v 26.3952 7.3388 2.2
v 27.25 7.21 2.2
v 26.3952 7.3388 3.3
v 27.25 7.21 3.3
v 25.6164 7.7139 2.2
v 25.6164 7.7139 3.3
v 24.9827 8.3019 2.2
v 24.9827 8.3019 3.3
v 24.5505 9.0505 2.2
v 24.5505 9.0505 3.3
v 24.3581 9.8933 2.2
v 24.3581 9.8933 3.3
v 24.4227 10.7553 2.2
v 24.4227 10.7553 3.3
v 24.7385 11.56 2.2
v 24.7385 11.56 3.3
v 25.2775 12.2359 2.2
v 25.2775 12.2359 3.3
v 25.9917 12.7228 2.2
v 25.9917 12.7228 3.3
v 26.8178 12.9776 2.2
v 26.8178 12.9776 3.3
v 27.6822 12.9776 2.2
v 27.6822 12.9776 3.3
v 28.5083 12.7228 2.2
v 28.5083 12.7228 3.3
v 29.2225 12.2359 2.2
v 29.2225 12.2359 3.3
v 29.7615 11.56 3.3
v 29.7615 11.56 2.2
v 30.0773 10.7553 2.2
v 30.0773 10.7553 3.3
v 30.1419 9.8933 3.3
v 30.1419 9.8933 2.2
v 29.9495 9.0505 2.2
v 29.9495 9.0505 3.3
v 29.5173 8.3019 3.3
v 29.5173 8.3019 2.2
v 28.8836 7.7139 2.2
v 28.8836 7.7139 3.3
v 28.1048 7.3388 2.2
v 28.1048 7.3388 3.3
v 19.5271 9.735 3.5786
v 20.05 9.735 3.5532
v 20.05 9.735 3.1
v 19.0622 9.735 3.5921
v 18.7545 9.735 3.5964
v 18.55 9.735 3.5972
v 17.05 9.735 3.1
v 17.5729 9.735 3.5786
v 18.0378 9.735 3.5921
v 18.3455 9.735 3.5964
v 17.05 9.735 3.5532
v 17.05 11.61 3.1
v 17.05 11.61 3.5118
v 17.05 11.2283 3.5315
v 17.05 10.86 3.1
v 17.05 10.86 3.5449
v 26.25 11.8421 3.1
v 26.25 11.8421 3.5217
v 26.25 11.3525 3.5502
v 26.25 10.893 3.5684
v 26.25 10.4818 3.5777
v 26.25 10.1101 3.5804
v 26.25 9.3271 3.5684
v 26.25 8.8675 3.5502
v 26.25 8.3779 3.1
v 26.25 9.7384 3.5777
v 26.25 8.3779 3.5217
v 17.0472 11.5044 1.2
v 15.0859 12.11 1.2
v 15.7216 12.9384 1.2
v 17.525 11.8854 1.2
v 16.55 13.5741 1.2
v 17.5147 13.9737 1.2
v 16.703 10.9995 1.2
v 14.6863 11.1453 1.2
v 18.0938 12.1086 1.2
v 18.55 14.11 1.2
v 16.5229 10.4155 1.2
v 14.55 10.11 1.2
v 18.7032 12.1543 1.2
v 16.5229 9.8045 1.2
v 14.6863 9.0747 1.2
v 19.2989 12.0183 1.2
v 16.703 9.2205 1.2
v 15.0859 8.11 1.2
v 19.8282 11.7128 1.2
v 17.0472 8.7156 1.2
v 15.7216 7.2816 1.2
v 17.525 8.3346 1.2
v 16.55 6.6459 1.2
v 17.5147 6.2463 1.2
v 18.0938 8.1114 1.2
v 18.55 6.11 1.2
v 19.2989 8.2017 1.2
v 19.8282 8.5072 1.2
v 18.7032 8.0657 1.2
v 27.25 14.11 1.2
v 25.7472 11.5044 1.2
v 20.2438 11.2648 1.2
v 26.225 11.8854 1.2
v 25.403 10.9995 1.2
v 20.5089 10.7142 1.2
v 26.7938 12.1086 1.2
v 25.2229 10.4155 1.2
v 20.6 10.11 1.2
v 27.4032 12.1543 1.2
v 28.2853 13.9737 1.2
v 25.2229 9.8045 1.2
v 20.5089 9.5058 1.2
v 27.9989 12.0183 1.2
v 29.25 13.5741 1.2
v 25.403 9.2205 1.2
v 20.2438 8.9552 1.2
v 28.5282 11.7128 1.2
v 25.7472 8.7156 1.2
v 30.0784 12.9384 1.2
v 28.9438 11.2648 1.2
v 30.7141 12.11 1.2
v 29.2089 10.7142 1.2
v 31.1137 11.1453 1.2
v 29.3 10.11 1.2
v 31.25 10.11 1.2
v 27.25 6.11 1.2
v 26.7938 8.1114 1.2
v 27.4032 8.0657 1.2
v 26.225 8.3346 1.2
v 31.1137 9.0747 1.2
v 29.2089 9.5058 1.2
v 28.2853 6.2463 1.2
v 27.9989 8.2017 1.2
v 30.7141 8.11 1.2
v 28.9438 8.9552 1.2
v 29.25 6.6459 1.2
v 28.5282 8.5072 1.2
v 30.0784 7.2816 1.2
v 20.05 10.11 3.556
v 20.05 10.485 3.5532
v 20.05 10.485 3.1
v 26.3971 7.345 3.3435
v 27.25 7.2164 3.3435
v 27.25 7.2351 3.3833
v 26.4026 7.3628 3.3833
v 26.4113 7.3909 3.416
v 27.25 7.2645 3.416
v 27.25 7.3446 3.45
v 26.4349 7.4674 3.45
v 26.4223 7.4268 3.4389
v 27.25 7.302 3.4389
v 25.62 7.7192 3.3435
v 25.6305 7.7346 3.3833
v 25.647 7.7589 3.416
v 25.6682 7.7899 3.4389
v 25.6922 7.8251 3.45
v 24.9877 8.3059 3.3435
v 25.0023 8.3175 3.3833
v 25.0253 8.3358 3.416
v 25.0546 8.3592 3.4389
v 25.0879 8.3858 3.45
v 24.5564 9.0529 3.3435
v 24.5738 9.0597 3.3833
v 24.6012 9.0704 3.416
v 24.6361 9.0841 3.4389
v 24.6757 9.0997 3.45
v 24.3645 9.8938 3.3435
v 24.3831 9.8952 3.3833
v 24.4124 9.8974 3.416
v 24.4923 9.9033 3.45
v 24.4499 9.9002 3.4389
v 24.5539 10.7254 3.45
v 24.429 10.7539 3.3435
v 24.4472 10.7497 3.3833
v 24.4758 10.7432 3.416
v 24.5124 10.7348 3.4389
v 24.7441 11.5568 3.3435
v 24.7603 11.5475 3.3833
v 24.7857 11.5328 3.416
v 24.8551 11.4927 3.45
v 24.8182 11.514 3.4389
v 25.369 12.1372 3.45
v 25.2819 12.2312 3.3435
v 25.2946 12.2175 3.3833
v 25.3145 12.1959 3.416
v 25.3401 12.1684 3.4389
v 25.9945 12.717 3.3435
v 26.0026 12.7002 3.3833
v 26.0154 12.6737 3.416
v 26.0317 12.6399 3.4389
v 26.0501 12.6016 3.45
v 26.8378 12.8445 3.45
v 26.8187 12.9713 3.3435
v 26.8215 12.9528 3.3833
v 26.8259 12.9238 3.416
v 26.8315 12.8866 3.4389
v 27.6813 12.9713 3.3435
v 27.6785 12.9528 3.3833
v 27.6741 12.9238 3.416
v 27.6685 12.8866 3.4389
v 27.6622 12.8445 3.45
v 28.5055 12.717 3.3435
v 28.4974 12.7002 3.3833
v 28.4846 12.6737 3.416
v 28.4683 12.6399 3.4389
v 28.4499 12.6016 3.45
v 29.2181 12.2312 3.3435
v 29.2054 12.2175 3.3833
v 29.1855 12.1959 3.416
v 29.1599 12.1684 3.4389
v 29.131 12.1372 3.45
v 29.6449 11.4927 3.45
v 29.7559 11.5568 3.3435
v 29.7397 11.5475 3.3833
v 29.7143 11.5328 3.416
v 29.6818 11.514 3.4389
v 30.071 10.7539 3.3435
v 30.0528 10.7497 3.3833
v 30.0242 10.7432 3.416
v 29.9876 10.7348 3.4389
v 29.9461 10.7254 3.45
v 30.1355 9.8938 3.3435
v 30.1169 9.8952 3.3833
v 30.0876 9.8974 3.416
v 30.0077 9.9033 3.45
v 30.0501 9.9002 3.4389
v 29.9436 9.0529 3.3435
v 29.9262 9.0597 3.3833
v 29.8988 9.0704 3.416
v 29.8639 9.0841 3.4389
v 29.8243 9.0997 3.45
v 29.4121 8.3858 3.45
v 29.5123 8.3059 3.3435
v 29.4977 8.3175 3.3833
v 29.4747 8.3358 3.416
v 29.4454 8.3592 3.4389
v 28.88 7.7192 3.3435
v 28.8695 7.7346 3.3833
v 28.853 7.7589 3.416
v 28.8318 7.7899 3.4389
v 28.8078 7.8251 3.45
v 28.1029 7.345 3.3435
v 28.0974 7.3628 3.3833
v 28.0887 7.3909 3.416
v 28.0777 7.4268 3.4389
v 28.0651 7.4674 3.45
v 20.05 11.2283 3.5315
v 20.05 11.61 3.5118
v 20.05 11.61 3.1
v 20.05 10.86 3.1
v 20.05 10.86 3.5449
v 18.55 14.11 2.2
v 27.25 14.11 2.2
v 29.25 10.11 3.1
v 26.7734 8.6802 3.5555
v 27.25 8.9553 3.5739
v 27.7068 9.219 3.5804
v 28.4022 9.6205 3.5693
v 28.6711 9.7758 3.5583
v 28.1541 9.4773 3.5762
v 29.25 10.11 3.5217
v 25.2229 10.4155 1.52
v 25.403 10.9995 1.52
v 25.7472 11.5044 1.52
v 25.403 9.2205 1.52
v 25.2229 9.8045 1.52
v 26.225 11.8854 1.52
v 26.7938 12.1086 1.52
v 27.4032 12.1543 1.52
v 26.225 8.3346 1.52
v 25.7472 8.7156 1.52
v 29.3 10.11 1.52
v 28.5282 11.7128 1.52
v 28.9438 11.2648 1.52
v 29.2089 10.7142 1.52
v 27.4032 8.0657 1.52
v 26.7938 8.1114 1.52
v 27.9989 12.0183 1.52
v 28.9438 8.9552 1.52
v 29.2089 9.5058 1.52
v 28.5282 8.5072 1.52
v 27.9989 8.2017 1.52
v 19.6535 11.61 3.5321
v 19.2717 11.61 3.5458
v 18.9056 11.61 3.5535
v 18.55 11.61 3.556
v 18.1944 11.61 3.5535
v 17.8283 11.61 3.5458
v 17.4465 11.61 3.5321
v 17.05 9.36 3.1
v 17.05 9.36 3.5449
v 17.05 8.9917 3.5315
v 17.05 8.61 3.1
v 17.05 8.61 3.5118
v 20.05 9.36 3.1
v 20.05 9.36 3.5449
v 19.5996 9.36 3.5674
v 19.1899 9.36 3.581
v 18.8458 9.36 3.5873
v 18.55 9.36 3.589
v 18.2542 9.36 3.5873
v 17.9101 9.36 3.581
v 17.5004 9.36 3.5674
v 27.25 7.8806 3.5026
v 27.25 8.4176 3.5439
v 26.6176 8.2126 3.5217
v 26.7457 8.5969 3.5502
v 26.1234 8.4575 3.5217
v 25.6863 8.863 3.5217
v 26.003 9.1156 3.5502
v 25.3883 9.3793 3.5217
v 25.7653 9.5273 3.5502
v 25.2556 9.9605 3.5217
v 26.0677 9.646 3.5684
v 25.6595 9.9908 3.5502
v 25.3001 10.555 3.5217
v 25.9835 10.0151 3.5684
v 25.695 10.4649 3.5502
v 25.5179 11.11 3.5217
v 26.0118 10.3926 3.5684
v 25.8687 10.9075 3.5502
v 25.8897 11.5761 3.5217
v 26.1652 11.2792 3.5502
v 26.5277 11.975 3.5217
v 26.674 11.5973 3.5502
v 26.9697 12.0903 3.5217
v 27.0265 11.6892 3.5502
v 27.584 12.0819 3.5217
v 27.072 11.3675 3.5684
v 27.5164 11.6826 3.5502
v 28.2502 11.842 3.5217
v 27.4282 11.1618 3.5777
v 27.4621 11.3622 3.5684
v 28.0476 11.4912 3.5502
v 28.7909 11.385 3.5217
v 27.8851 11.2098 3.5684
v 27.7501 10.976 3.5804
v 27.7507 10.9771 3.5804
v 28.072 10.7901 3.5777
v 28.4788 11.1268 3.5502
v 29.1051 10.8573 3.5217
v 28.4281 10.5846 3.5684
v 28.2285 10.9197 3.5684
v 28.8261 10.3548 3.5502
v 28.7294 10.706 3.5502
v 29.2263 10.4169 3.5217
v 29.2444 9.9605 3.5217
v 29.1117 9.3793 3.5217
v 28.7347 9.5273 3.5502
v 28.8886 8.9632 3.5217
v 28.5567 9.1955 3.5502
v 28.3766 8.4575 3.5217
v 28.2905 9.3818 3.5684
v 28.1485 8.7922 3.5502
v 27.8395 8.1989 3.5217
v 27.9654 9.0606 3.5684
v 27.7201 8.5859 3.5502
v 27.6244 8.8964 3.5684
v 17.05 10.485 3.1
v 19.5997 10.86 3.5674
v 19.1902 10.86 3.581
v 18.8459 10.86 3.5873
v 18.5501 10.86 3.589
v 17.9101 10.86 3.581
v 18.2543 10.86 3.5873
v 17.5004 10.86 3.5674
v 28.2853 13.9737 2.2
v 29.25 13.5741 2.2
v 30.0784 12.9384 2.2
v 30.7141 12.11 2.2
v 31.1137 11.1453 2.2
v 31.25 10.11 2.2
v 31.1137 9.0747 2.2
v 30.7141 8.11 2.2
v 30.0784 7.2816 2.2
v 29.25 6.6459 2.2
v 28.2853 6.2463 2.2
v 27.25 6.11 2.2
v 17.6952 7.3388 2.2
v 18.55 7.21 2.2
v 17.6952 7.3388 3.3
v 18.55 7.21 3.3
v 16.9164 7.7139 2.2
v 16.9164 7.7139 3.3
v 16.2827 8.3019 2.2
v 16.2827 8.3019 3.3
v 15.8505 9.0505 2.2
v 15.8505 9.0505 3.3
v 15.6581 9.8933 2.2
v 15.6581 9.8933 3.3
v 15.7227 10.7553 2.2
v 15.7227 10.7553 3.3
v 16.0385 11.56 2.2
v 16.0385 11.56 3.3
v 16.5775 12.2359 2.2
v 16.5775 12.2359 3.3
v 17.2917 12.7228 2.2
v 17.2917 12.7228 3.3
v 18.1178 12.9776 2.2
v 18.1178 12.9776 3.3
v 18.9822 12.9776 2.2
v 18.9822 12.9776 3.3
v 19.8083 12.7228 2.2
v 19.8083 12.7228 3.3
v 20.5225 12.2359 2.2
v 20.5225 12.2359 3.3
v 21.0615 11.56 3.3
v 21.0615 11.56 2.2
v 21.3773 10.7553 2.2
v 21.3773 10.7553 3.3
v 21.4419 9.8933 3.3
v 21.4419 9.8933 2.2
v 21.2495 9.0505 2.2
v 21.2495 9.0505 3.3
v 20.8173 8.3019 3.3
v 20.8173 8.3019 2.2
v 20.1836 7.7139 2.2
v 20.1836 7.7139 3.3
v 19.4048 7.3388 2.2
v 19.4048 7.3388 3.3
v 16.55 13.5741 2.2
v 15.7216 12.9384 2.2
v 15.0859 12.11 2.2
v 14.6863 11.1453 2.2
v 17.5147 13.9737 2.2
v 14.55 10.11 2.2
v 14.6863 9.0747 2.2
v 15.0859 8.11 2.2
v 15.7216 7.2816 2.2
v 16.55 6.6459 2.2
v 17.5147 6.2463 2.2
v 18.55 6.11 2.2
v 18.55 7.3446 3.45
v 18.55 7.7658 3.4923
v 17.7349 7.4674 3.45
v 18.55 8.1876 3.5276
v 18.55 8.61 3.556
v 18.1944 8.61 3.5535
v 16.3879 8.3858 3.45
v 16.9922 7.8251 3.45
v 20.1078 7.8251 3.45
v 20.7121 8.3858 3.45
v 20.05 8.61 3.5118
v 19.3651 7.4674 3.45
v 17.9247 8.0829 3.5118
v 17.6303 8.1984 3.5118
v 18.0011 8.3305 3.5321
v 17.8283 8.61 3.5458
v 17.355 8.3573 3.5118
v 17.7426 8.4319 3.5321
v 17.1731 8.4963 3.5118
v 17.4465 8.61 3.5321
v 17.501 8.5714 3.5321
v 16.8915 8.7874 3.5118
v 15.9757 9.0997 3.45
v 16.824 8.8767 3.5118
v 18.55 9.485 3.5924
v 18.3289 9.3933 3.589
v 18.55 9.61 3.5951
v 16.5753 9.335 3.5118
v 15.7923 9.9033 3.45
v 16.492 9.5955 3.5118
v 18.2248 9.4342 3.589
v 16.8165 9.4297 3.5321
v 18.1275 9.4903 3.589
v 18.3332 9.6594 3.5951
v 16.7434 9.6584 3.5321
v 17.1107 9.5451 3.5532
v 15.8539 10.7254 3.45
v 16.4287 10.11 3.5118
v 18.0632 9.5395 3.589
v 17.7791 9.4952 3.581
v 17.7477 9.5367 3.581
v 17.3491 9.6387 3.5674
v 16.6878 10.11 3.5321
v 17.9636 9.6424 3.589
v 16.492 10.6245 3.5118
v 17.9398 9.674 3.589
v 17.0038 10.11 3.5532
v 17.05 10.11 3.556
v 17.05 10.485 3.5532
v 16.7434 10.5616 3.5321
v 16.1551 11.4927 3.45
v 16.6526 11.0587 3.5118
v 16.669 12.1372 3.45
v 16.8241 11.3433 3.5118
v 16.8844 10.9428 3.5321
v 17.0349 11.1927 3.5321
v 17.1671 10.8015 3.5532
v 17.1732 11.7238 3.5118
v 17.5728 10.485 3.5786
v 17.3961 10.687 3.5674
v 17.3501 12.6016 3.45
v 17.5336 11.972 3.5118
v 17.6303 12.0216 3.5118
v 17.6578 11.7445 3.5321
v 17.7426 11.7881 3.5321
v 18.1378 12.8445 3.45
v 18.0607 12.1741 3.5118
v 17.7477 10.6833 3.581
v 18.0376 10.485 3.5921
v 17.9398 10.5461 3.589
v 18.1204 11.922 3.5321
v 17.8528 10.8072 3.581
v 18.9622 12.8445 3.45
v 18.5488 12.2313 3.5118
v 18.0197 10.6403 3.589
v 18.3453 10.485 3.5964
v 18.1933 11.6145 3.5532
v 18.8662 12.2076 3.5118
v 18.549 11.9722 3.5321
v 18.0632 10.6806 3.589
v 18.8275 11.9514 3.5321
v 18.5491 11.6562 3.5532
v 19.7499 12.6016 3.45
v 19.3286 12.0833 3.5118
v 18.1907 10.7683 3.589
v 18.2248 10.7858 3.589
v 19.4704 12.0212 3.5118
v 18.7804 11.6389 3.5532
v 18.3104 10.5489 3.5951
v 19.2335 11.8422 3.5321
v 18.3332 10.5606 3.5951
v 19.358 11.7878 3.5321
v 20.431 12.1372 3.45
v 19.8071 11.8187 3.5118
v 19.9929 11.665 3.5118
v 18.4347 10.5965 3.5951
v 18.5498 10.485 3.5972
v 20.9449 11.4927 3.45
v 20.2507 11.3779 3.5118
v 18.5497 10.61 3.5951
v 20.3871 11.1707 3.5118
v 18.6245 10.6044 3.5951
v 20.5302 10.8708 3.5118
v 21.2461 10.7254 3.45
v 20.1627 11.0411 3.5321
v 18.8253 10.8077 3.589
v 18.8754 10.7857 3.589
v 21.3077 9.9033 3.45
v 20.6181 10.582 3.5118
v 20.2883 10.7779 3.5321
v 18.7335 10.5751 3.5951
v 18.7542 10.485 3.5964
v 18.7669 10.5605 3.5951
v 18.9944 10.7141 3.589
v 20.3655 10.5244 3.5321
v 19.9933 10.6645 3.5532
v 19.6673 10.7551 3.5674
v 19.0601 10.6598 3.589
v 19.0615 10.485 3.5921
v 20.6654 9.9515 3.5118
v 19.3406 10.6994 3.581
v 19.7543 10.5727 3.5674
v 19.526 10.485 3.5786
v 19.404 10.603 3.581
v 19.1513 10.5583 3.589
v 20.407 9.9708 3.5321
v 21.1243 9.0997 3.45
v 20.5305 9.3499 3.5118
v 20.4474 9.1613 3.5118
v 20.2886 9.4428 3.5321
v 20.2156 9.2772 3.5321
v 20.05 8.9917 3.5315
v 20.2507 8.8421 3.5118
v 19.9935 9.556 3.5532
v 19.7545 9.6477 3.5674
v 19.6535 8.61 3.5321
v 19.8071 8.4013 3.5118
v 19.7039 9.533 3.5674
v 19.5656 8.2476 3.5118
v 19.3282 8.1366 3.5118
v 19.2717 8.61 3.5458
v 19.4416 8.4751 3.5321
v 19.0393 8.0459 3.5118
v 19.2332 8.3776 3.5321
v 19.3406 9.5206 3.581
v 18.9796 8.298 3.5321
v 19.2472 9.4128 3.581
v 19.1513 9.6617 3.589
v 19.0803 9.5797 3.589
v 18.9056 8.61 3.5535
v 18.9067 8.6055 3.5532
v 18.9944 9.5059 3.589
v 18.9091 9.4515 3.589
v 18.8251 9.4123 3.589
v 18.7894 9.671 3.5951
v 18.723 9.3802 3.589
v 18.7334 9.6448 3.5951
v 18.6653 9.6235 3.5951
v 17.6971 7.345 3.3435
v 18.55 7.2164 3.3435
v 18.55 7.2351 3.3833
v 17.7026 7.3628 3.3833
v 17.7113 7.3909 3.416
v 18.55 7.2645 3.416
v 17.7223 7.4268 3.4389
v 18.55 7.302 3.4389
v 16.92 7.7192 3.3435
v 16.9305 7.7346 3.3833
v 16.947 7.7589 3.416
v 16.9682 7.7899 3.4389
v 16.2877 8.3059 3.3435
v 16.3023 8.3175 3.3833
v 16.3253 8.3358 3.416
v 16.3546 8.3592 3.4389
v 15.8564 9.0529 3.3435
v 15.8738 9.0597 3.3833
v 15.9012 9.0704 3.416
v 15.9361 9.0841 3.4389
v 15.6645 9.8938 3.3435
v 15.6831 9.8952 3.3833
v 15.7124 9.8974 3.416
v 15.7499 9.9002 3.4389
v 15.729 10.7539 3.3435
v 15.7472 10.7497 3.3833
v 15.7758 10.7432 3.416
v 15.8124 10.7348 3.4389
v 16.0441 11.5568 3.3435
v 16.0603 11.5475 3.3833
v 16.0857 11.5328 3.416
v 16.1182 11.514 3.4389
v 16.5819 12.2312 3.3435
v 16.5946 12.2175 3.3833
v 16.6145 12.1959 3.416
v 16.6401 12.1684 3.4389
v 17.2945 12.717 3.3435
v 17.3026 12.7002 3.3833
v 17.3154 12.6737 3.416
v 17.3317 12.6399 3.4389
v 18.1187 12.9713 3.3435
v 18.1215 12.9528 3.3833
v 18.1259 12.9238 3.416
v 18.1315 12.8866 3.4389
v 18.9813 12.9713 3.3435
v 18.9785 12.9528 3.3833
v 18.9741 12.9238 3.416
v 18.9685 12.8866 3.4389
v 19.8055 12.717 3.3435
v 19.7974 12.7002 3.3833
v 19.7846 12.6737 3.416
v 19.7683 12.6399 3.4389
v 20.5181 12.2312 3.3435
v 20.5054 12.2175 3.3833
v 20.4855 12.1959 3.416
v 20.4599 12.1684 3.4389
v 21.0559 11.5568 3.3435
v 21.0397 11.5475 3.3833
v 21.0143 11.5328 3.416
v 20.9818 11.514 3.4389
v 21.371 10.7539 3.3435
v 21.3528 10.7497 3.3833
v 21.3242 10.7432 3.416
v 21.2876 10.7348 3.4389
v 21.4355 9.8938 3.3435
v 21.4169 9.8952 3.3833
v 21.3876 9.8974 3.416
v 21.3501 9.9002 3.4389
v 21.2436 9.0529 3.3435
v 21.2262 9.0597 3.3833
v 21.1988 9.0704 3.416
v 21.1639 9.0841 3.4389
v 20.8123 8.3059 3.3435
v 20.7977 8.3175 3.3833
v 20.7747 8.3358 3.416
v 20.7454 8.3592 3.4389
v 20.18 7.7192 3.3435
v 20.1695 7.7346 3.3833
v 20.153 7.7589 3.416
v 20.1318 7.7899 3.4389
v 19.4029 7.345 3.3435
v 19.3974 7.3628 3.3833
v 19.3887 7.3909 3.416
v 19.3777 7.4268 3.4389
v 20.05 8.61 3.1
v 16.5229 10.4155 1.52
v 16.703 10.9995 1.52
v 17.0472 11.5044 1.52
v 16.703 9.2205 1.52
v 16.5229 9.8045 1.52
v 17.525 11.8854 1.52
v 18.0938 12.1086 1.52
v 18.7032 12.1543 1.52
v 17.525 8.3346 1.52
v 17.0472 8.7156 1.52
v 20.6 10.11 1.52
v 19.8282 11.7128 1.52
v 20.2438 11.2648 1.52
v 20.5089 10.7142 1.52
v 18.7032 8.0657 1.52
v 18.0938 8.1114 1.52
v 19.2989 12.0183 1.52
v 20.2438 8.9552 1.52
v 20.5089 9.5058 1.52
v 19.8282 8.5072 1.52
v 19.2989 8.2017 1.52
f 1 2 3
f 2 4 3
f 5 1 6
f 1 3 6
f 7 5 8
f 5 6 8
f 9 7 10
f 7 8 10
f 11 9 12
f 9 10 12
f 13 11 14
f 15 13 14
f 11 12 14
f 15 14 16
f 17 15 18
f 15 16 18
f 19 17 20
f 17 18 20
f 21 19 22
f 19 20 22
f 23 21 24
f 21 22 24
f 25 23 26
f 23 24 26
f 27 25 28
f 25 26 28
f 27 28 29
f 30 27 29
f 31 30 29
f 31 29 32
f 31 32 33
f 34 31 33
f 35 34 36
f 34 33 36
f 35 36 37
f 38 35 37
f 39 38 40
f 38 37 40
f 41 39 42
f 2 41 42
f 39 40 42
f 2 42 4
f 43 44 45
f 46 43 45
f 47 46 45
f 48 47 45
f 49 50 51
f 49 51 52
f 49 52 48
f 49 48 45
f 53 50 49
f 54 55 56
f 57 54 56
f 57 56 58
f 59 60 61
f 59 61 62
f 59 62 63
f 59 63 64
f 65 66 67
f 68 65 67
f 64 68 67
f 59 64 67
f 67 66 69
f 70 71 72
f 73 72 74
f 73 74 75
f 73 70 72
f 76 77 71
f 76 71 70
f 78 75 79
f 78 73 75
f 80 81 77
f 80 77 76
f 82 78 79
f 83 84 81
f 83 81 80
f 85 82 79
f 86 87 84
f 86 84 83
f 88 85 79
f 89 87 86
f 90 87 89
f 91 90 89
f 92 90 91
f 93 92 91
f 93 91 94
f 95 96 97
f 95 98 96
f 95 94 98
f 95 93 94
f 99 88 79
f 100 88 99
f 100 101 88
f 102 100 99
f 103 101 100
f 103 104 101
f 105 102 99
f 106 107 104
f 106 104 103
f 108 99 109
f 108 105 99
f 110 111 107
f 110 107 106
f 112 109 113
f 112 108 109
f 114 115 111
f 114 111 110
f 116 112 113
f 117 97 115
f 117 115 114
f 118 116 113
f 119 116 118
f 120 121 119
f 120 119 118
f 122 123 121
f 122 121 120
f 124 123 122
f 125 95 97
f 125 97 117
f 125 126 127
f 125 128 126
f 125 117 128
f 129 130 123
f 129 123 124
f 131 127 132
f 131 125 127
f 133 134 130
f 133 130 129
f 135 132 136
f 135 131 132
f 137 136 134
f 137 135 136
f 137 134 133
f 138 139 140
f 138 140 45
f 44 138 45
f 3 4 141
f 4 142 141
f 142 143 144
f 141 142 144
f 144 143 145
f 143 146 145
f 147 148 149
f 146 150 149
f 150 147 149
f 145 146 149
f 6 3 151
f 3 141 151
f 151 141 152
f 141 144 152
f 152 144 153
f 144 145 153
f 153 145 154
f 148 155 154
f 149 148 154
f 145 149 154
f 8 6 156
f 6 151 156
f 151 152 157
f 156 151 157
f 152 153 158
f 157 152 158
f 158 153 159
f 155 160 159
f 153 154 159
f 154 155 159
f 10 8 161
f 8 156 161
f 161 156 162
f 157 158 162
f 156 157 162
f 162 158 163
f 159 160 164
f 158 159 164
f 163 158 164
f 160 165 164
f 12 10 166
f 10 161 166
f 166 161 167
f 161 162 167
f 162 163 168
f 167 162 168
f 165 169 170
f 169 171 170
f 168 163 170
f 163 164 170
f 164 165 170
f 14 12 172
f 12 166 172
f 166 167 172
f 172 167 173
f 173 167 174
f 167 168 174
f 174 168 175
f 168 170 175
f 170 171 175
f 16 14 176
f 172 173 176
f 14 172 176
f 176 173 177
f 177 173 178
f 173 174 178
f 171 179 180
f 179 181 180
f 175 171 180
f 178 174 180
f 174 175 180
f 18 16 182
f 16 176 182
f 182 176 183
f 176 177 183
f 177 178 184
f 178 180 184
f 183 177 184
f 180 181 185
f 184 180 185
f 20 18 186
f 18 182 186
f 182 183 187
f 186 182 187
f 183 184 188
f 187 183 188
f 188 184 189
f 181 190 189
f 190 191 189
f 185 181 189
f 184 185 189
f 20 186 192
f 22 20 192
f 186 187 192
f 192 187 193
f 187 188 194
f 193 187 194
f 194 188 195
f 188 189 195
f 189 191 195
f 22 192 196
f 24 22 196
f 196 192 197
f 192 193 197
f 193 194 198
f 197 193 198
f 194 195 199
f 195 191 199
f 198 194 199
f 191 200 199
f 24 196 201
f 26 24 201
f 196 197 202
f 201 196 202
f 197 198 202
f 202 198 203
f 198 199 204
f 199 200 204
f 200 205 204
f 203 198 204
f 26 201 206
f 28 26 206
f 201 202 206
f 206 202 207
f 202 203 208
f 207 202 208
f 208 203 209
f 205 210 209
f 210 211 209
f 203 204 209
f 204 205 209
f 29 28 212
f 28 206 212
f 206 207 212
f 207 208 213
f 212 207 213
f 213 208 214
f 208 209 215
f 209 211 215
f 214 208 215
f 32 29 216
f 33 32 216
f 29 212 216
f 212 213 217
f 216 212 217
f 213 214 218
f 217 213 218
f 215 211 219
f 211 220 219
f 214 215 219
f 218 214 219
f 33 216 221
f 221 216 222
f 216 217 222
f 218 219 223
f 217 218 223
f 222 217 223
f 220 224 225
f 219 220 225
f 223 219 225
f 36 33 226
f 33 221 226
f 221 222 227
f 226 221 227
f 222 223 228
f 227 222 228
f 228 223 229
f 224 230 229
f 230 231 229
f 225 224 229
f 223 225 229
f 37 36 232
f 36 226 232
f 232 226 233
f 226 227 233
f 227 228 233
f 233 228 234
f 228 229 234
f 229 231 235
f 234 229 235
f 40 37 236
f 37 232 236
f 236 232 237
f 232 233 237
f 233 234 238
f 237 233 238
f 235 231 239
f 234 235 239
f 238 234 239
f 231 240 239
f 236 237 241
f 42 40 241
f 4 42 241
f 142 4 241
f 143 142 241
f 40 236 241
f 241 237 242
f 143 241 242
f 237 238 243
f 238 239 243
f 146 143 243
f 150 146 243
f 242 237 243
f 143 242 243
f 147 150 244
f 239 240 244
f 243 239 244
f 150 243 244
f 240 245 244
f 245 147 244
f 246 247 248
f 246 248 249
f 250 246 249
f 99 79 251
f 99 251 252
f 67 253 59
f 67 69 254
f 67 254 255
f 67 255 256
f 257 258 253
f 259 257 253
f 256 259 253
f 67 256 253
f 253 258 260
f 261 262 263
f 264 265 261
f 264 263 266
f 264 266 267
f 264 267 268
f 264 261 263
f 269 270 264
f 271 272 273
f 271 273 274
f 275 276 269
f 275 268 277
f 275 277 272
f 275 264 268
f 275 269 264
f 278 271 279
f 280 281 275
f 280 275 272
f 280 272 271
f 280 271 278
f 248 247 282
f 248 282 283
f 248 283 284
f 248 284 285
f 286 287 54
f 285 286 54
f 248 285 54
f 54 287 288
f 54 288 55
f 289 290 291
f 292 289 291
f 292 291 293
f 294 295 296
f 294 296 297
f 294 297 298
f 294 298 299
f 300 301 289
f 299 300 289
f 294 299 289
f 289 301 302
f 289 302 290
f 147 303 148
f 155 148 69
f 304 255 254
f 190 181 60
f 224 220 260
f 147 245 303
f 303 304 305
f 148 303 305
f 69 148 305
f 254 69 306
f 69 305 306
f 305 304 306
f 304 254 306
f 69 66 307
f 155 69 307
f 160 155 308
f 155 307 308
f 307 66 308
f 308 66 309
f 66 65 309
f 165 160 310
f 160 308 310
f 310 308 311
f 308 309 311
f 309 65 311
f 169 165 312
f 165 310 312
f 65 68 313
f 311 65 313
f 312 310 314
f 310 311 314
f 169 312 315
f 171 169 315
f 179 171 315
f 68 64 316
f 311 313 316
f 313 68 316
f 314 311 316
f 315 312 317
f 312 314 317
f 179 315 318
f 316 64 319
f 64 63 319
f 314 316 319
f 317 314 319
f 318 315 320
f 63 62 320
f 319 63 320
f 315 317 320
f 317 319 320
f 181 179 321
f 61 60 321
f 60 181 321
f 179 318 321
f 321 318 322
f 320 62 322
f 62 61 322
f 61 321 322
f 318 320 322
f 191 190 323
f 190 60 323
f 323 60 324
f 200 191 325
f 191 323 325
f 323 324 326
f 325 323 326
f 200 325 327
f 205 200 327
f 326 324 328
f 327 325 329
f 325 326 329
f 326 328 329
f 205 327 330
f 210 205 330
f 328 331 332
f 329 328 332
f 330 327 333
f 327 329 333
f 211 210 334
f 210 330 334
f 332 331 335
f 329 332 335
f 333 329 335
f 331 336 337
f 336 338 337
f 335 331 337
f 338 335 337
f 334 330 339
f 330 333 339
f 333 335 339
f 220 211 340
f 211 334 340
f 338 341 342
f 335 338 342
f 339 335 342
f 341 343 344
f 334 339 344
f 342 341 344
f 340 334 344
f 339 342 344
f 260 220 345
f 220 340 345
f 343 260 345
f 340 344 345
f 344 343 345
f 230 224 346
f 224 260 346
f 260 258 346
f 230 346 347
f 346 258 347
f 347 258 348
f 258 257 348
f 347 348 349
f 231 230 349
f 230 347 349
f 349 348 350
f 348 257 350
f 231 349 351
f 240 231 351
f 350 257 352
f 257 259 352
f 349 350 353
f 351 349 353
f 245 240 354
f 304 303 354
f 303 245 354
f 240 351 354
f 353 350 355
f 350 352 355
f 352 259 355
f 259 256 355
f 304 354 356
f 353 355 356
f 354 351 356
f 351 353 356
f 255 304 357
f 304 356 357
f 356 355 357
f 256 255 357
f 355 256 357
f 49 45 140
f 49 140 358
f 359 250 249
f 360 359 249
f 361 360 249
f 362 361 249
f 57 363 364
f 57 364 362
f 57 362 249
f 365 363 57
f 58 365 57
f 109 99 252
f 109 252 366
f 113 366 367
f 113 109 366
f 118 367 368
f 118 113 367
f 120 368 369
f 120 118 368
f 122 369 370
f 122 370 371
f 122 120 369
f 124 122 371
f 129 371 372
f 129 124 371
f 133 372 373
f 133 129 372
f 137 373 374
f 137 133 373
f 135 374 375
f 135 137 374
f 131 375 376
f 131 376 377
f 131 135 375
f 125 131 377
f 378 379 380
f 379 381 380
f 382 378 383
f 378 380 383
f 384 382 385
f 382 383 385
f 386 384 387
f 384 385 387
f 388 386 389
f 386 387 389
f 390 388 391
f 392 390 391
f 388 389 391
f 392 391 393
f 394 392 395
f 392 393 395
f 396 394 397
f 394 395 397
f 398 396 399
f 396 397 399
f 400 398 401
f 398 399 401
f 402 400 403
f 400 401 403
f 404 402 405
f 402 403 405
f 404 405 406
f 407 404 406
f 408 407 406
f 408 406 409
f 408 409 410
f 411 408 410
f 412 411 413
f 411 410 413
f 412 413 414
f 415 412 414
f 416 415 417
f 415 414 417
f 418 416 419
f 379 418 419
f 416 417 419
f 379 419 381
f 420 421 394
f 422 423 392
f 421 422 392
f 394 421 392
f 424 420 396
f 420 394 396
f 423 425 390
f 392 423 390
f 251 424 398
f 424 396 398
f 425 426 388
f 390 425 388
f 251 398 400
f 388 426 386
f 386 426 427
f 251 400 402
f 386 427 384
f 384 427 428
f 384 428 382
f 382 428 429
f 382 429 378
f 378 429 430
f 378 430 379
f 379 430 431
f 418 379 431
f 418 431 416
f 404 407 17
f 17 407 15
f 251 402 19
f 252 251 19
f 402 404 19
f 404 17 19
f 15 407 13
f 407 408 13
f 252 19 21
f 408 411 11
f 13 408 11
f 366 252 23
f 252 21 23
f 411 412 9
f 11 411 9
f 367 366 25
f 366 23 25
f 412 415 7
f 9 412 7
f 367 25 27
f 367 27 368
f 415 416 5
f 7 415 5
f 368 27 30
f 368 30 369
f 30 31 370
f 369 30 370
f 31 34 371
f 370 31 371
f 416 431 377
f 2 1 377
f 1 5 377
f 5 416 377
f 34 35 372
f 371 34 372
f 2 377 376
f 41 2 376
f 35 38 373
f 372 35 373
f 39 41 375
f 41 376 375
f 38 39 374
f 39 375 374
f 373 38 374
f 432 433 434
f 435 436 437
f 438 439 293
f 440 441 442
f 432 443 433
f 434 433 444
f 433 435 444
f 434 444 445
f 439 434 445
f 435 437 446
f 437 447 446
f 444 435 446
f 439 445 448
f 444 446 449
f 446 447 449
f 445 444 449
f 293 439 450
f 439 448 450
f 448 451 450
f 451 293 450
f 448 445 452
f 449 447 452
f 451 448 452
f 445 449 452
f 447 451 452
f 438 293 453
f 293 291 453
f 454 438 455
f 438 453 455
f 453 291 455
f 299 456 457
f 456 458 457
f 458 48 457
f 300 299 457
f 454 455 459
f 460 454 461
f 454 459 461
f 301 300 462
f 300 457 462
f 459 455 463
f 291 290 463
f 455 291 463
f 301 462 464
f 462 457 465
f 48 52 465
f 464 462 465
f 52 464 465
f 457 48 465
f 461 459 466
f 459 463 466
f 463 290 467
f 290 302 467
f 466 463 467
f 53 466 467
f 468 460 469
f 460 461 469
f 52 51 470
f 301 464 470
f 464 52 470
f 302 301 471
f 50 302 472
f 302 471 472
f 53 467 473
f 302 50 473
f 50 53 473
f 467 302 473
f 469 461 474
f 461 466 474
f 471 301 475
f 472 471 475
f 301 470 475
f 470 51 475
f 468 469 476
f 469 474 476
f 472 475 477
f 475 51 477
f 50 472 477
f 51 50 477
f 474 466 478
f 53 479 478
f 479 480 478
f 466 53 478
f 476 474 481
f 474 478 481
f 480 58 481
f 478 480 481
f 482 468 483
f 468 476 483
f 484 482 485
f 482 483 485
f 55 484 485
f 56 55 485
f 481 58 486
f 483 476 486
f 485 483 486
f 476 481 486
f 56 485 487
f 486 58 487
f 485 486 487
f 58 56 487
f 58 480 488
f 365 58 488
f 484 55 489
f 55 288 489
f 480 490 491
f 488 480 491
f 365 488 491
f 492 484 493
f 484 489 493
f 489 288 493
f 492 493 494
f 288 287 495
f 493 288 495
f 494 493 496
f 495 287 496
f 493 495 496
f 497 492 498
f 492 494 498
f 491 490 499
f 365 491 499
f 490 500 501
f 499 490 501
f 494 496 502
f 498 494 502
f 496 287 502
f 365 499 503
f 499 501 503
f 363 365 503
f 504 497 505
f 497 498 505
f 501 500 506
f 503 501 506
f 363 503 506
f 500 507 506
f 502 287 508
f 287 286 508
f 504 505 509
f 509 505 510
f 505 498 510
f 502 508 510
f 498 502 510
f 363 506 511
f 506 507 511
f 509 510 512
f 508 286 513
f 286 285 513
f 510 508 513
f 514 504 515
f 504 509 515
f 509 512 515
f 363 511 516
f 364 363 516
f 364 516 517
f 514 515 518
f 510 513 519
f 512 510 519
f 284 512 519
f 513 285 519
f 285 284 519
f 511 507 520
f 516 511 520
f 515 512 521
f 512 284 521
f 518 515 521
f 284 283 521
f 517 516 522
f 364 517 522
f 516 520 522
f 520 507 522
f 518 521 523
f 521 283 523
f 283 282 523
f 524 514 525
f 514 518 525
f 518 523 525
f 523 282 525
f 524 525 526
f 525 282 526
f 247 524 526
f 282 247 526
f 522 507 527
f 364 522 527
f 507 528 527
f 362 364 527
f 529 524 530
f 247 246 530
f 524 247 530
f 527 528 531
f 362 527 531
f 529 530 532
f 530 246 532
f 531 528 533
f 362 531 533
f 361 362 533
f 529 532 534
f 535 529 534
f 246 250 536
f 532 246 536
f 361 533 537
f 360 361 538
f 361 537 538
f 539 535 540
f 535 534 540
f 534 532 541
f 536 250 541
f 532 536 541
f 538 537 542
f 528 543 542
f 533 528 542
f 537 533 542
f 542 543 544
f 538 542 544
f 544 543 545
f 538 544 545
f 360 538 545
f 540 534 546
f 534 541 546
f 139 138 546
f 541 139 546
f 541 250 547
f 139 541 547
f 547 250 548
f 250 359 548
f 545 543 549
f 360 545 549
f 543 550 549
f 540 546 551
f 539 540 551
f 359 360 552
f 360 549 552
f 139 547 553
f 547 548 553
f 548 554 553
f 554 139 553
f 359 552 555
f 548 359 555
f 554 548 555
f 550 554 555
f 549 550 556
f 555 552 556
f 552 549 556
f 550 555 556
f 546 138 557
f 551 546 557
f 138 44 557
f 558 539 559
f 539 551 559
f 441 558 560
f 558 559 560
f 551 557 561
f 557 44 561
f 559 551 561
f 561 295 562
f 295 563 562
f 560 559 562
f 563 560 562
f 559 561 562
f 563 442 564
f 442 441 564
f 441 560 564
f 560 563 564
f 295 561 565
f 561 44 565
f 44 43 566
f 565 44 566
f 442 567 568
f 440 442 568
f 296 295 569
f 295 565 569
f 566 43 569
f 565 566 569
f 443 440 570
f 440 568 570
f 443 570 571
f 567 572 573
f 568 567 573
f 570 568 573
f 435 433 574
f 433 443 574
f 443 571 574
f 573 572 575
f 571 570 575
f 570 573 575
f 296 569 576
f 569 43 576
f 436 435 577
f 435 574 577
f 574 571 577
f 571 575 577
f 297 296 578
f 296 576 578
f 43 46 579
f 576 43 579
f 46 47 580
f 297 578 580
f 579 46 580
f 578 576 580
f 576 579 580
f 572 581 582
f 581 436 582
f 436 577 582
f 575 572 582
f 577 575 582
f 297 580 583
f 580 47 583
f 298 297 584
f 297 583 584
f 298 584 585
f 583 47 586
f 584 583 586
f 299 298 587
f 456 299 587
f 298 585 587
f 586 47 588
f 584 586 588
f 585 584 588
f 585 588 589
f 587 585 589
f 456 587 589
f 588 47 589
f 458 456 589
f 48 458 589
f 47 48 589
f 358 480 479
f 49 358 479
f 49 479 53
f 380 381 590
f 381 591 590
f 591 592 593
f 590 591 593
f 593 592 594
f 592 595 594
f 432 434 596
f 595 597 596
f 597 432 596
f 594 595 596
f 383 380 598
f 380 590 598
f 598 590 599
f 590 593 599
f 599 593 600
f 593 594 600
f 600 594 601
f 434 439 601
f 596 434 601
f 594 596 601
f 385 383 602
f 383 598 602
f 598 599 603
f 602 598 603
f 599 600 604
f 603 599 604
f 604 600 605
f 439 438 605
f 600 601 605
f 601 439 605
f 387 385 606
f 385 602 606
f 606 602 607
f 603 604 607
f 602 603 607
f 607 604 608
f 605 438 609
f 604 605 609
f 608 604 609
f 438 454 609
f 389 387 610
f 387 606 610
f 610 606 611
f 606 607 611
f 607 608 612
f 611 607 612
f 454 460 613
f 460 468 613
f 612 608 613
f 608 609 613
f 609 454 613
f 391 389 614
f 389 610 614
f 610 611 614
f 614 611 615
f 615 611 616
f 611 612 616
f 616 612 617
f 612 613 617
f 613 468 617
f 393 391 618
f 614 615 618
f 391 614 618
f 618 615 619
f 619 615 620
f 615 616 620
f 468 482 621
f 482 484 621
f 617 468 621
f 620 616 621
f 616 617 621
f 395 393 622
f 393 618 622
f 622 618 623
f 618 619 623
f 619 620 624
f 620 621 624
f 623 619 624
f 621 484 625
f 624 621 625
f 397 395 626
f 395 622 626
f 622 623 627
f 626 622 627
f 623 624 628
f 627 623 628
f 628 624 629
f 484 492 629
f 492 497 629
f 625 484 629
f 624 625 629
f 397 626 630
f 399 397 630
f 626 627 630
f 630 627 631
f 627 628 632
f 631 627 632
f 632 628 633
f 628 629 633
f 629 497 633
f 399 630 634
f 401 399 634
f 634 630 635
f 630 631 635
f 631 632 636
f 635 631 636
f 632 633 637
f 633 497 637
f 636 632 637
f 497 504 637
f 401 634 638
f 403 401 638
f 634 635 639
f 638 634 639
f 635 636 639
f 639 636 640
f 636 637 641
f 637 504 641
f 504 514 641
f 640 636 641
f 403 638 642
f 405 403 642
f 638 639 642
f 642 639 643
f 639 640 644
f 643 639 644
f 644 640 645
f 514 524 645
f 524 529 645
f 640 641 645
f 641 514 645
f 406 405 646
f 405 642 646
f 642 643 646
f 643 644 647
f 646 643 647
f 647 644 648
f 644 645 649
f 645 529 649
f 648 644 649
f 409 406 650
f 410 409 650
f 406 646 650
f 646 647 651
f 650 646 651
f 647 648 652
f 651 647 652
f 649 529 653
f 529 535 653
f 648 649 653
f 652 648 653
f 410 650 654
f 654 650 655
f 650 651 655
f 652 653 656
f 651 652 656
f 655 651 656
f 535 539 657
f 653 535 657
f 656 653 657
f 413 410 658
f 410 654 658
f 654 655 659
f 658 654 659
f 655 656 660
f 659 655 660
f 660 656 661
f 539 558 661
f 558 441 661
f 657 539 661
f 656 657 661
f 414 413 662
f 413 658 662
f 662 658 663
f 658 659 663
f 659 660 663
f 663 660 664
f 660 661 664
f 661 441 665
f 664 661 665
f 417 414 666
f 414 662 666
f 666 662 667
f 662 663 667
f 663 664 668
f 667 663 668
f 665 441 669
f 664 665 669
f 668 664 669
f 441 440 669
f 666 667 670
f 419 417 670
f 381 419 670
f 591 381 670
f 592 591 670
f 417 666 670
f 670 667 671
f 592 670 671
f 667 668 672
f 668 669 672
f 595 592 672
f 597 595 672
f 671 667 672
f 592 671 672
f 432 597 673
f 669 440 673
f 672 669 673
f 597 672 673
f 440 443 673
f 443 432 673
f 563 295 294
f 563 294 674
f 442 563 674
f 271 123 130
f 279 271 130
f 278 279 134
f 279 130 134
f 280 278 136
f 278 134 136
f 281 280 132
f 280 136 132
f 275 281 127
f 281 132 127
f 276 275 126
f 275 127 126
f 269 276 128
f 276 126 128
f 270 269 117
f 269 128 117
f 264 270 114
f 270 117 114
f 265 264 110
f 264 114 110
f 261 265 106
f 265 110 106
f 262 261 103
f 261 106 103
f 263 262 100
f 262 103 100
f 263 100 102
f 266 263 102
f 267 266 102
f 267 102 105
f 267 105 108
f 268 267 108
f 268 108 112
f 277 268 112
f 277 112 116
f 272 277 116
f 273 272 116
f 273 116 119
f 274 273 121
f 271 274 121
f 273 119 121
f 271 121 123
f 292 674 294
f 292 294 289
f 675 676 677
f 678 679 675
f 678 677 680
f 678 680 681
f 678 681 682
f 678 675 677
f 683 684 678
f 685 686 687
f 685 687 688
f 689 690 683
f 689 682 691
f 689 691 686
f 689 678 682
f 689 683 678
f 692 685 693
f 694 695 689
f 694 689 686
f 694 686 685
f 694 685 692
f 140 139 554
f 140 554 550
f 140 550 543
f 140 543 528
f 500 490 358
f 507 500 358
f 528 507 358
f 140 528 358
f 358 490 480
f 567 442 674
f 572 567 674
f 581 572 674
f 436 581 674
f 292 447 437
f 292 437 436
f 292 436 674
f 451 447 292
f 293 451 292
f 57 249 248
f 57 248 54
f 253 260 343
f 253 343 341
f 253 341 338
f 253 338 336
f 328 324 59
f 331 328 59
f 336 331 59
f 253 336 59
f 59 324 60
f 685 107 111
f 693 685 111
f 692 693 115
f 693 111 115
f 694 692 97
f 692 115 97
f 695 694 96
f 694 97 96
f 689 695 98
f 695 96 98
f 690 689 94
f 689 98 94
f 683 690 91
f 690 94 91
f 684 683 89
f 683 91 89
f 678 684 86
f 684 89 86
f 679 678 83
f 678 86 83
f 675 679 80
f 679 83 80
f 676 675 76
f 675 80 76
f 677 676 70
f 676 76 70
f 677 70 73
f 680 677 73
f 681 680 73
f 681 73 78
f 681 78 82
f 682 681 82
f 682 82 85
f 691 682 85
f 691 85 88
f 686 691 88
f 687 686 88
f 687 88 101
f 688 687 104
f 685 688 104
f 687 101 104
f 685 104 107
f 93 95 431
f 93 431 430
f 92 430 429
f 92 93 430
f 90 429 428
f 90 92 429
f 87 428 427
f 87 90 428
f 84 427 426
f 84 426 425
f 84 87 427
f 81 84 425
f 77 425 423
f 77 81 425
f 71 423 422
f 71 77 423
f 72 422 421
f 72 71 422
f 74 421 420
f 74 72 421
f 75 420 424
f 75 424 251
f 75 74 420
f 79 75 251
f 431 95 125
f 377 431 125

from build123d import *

# Parameters (mm, degrees)
PAD005_DEPTH           = 1
SKETCH011_R            = 2.05
POCKET008_DEPTH        = 0.32
LINEARPATTERN002_COUNT = 2
LINEARPATTERN002_PITCH = 8.7
LINEARPATTERN003_COUNT = 2
LINEARPATTERN003_PITCH = 8.7
SKETCH013_W            = 3
SKETCH013_H            = 0.75
POCKET009_DEPTH        = 0.5


with BuildPart() as part:
    # Sketch010 (on DatumPlane) → Pad005 (new body)
    with BuildSketch(Plane(origin=(0, 0, 1.2), x_dir=(1, 0, 0), z_dir=(0, 0, -1))):
        with BuildLine():
            ThreePointArc((18.55, -6.11), (14.55, -10.11), (18.55, -14.11))
            Line((18.55, -14.11), (27.25, -14.11))
            ThreePointArc((27.25, -14.11), (31.25, -10.11), (27.25, -6.11))
            Line((18.55, -6.11), (27.25, -6.11))
        make_face()
    extrude(amount=-PAD005_DEPTH)

    # Sketch011 (on Face2 of Pad005) → Pocket008 (cut)
    with BuildSketch(Plane(origin=(0, 0, 1.2), x_dir=(1, 0, 0), z_dir=(0, 0, -1))):
        with Locations((18.55, -10.11)):
            Circle(SKETCH011_R)
    pocket008 = extrude(amount=-POCKET008_DEPTH, mode=Mode.SUBTRACT)

    # LinearPattern002: Pocket008 ×2
    with Locations(*[(i * LINEARPATTERN002_PITCH, 0, 0) for i in range(1, LINEARPATTERN002_COUNT)]):
        add(pocket008, mode=Mode.SUBTRACT)

    # Sketch012 (on DatumPlane) → Revolution001 (revolve)
    with BuildSketch(Plane(origin=(18.55, 6.74, 1.2), x_dir=(0, -1, 0), z_dir=(-1, 0, 0))):
        with BuildLine():
            Line((-3.37, 1), (-3.37, 2.4))
            ThreePointArc((-0.604564, 2.25), (-1.985249, 2.362472), (-3.37, 2.4))
            ThreePointArc((-0.47, 2.1), (-0.508571, 2.200756), (-0.604564, 2.25))
            Line((-0.47, 1), (-0.47, 2.1))
            Line((-3.37, 1), (-0.47, 1))
        make_face()
    revolution001 = revolve(axis=Axis((18.55, 10.11, 1.2), (0, 0, -1)))

    # LinearPattern003: Revolution001 ×2
    with Locations(*[(i * LINEARPATTERN003_PITCH, 0, 0) for i in range(1, LINEARPATTERN003_COUNT)]):
        add(revolution001)

    # Sketch013 (on DatumPlane) → Pocket009 (cut)
    with BuildSketch(Plane(origin=(27.25, 10.11, 3.6), x_dir=(-1, 0, 0), z_dir=(0, 0, 1))):
        Polygon((1, 1.732051), (-2, 0), (1, -1.732051), align=None)
        with Locations((8.7, 0)):
            Rectangle(SKETCH013_W, SKETCH013_H)
        with Locations((8.7, 1.125)):
            Rectangle(SKETCH013_W, SKETCH013_H)
        with Locations((8.7, -1.125)):
            Rectangle(SKETCH013_W, SKETCH013_H)
    extrude(amount=-POCKET009_DEPTH, mode=Mode.SUBTRACT)


solid = part.part
